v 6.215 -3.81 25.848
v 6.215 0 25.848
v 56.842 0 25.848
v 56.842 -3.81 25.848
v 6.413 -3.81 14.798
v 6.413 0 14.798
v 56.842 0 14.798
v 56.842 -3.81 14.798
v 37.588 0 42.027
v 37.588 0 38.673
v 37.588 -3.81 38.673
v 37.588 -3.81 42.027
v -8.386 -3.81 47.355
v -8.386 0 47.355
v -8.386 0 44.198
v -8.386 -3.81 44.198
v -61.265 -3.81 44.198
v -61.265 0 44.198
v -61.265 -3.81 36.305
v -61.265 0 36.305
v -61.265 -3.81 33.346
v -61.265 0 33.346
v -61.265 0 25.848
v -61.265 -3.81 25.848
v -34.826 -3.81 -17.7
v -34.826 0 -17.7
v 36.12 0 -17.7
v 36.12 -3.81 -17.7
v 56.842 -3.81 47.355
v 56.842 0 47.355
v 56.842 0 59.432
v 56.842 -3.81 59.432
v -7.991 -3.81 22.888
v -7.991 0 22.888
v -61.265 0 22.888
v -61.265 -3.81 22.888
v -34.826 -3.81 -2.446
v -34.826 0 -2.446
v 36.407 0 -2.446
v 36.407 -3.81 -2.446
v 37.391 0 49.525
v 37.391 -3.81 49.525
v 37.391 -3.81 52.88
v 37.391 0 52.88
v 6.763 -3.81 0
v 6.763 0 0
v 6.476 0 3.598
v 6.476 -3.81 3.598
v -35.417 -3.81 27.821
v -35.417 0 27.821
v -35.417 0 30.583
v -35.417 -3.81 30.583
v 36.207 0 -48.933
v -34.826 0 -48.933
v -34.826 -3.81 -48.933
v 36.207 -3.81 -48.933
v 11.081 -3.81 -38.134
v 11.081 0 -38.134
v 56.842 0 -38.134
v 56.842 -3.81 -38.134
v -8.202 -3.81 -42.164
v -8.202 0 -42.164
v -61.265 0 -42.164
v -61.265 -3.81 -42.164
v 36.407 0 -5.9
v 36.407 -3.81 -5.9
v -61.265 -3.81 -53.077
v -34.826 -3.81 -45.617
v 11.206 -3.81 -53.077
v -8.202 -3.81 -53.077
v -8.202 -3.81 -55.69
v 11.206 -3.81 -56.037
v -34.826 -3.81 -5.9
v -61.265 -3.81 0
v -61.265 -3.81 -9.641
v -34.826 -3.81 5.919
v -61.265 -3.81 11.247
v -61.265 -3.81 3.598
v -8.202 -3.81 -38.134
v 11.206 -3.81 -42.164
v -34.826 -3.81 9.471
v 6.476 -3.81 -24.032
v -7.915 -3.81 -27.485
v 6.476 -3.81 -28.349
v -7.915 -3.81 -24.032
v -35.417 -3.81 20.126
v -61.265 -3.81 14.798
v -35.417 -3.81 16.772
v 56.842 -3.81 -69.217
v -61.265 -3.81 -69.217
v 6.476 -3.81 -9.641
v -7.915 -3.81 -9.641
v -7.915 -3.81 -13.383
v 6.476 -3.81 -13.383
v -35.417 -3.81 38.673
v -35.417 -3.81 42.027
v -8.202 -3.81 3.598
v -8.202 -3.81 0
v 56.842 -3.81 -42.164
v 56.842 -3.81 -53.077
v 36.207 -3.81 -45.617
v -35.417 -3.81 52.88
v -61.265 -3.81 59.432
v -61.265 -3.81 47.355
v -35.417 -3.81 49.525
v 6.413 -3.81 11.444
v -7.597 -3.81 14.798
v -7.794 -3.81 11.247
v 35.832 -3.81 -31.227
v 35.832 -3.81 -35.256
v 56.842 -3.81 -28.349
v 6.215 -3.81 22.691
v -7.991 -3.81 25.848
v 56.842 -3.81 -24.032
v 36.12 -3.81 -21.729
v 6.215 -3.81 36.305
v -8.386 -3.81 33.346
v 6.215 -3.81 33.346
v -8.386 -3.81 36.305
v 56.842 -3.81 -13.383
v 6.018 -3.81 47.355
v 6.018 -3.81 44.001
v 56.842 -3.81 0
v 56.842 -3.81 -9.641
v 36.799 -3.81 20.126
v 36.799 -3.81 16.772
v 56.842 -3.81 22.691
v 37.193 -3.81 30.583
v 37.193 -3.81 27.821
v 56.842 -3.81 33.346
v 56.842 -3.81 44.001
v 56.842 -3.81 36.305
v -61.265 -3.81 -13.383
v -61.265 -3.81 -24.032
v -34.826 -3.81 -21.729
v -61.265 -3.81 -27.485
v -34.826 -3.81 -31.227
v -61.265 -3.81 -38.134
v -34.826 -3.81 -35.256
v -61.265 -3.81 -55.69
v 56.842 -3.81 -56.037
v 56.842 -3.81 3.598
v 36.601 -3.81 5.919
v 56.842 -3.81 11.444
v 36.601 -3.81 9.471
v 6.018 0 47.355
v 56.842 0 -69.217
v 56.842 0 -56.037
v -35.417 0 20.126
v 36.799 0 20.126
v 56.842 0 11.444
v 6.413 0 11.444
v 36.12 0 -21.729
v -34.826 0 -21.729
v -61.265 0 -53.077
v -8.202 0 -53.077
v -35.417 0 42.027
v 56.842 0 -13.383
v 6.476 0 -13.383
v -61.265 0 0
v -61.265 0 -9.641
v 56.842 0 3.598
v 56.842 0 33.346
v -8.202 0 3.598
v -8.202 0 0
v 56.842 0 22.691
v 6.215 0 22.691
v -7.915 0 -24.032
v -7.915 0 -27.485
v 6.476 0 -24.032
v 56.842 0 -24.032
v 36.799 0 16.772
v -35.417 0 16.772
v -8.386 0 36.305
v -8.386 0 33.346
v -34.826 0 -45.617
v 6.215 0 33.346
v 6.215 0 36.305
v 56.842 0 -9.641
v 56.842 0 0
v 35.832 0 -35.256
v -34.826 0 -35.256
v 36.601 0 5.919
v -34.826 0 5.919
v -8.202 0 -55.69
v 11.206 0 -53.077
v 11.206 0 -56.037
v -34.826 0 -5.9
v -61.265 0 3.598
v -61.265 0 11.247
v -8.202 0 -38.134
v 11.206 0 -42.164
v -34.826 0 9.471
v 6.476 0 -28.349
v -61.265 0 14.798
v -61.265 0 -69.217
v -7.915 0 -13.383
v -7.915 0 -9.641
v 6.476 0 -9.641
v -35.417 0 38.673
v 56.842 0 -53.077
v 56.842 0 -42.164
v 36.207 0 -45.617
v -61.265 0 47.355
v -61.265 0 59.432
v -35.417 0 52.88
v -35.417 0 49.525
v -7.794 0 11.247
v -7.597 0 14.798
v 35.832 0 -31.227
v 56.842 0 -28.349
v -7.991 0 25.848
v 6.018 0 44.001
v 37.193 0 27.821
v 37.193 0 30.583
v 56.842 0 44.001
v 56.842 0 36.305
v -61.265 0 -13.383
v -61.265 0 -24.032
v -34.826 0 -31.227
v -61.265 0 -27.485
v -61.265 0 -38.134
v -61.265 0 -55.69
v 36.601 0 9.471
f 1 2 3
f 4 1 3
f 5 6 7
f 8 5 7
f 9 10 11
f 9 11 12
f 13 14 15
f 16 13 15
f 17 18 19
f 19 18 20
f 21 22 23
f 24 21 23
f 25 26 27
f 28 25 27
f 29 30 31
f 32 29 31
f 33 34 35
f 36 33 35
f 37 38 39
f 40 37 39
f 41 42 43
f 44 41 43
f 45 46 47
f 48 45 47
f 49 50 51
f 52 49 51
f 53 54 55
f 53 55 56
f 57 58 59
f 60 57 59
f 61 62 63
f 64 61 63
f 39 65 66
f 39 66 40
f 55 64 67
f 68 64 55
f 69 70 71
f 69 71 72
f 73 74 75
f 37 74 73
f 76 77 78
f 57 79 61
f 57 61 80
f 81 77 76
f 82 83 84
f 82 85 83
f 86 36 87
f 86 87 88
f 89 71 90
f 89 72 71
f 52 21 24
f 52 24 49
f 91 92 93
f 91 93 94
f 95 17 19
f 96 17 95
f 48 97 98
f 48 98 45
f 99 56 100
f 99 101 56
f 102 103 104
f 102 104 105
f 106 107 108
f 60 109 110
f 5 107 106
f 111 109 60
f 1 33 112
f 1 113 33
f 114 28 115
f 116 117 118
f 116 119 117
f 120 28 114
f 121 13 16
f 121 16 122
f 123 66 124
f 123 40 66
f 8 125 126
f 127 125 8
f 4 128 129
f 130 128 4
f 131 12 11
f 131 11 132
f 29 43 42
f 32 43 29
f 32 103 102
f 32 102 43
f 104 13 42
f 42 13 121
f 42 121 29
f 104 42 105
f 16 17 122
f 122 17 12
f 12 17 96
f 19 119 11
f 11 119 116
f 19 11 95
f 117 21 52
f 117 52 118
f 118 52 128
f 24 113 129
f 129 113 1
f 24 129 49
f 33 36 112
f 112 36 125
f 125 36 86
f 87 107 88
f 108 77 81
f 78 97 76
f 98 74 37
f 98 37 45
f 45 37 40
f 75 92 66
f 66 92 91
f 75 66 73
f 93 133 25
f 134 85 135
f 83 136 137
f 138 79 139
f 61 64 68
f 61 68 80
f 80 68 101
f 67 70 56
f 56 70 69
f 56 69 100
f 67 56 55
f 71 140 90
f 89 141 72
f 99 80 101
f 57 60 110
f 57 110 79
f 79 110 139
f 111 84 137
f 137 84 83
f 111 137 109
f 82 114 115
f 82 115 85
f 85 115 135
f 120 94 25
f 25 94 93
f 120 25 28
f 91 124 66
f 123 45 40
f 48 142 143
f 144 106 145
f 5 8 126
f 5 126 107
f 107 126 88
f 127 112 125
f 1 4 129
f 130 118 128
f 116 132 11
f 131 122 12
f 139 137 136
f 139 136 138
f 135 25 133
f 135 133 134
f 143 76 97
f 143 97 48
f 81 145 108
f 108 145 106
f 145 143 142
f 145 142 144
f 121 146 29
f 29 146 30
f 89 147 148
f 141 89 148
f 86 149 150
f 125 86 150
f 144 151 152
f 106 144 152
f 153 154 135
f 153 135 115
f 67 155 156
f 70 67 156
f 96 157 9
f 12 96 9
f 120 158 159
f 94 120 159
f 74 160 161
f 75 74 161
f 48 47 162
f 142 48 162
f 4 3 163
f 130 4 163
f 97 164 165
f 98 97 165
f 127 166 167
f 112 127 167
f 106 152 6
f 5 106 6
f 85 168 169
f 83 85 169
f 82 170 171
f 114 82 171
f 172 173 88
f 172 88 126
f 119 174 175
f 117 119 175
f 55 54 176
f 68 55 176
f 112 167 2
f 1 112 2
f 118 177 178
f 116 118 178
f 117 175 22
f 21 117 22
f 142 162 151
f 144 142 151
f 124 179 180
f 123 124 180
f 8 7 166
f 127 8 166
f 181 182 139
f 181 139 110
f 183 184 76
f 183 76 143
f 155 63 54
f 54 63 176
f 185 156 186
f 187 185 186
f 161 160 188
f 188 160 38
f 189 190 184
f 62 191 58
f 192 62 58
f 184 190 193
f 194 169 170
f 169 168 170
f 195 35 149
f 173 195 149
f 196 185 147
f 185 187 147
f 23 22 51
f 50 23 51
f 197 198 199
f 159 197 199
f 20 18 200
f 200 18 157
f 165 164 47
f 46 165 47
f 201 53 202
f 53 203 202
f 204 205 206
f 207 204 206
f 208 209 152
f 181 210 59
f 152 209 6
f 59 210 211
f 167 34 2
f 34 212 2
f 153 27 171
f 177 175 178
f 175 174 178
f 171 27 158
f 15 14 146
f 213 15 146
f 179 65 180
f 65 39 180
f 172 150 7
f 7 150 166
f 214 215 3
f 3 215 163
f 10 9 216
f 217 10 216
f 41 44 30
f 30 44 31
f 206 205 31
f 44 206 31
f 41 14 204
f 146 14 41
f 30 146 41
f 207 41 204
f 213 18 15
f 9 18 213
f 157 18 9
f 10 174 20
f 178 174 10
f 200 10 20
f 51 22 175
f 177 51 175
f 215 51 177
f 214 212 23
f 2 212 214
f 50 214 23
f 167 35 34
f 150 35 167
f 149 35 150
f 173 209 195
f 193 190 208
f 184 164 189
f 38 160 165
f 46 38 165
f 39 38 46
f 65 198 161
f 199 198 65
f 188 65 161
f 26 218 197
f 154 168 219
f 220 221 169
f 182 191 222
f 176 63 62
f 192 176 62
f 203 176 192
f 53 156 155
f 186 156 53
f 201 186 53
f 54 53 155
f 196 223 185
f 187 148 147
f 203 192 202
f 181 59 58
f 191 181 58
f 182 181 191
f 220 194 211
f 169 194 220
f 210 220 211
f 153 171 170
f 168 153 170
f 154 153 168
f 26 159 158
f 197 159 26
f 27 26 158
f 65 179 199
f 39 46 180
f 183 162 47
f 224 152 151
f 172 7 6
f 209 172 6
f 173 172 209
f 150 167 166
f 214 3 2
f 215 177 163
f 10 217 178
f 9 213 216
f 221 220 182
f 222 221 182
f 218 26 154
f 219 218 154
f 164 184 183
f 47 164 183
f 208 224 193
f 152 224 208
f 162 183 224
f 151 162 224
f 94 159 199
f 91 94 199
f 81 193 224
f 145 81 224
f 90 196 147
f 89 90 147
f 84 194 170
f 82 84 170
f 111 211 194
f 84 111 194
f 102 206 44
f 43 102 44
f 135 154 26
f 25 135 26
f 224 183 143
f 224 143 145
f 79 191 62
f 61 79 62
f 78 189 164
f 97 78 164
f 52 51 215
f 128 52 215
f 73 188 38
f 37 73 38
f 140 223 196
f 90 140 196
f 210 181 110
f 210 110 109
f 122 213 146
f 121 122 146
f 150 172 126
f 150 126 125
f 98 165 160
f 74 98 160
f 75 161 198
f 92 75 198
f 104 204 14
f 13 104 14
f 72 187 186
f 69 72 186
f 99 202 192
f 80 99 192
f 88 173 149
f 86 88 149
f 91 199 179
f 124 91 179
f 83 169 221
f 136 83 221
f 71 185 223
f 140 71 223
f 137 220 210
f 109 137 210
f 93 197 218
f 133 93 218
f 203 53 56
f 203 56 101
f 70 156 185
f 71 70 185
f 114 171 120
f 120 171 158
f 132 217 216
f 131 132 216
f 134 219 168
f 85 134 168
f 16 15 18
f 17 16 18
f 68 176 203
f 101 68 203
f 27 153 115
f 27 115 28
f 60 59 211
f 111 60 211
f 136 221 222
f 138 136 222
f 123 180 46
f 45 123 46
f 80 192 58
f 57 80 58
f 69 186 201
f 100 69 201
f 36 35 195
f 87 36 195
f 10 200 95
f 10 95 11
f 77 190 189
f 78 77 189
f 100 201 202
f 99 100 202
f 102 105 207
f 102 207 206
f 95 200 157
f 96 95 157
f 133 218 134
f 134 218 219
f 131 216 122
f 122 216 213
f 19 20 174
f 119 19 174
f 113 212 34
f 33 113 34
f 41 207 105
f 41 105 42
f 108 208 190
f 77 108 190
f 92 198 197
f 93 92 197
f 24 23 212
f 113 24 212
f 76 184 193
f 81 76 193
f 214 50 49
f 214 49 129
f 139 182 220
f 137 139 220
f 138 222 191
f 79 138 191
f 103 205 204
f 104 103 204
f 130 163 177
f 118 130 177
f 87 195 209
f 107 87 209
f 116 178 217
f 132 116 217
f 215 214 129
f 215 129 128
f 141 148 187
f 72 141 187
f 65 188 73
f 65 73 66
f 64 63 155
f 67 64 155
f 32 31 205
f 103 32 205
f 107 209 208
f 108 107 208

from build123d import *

# Parameters (mm, degrees)
F0_W     = 71.032305
F0_H     = 3.316156
F0_W_2   = 70.65738
F0_H_2   = 4.029283
F0_W_3   = 70.945185
F0_H_3   = 4.029279
F0_W_4   = 71.23299
F0_H_4   = 3.453669
F0_W_5   = 71.426928
F0_H_5   = 3.551615
F0_W_6   = 72.216179
F0_H_6   = 3.354305
F0_W_7   = 72.610803
F0_H_7   = 2.762366
F0_W_8   = 73.005423
F0_H_8   = 3.354303
F0_W_9   = 72.808113
F0_H_9   = 3.354299
F1_DEPTH = 3.81


with BuildPart() as f1:
    # F0 (on Front) → F1 (new body)
    with BuildSketch(Plane.XZ):
        Polygon((56.841634, 59.431892), (-61.265364, 59.431892), (-61.265364, 47.354873), (-8.385758, 47.354873), (-8.385758, 44.197883), (-61.265364, 44.197883), (-61.265364, 36.305401), (-8.385758, 36.305401), (-8.385758, 33.345722), (-61.265364, 33.345722), (-61.265364, 25.847867), (-7.991134, 25.847867), (-7.991134, 22.888189), (-61.265364, 22.888189), (-61.265364, 14.798397), (-7.596511, 14.798397), (-7.793822, 11.246782), (-61.265364, 11.246782), (-61.265364, 3.597572), (-8.202464, 3.597572), (-8.202464, 0), (-61.265364, 0), (-61.265364, -9.641493), (-7.914659, -9.641493), (-7.914659, -13.382968), (-61.265364, -13.382968), (-61.265364, -24.031783), (-7.914659, -24.031783), (-7.914659, -27.485449), (-61.265364, -27.485449), (-61.265364, -38.134262), (-8.202464, -38.134262), (-8.202464, -42.163543), (-61.265364, -42.163543), (-61.265364, -53.076919), (-8.202464, -53.076919), (-8.202464, -55.690415), (-61.265364, -55.690415), (-61.265364, -69.217287), (56.841634, -69.217287), (56.841634, -56.036595), (11.206436, -56.036595), (11.206436, -53.076919), (56.841634, -53.076919), (56.841634, -42.163543), (11.206436, -42.163543), (11.080521, -38.134262), (56.841634, -38.134262), (56.841634, -28.348867), (6.475631, -28.348867), (6.475631, -24.031783), (56.841634, -24.031783), (56.841634, -13.382968), (6.475631, -13.382968), (6.475631, -9.641493), (56.841634, -9.641493), (56.841634, 0), (6.763437, 0), (6.475631, 3.597572), (56.841634, 3.597572), (56.841634, 11.444095), (6.412639, 11.444095), (6.412639, 14.798397), (56.841634, 14.798397), (56.841634, 22.690875), (6.215328, 22.690875), (6.215328, 25.847867), (56.841634, 25.847867), (56.841634, 33.345722), (6.215328, 33.345722), (6.215328, 36.305401), (56.841634, 36.305401), (56.841634, 44.000566), (6.018014, 44.000566), (6.018014, 47.354873), (56.841634, 47.354873), align=None)
        with Locations((0.690593, -47.27529)):
            Rectangle(F0_W, F0_H, mode=Mode.SUBTRACT)
        with Locations((0.50313, -33.241566)):
            Rectangle(F0_W_2, F0_H_2, mode=Mode.SUBTRACT)
        with Locations((0.647033, -19.714693)):
            Rectangle(F0_W_3, F0_H_3, mode=Mode.SUBTRACT)
        with Locations((0.790935, -4.173183)):
            Rectangle(F0_W_4, F0_H_4, mode=Mode.SUBTRACT)
        with Locations((0.887904, 7.695167)):
            Rectangle(F0_W_5, F0_H_5, mode=Mode.SUBTRACT)
        with Locations((0.690593, 18.448668)):
            Rectangle(F0_W_6, F0_H_6, mode=Mode.SUBTRACT)
        with Locations((0.887905, 29.202171)):
            Rectangle(F0_W_7, F0_H_7, mode=Mode.SUBTRACT)
        with Locations((1.085214, 40.350296)):
            Rectangle(F0_W_8, F0_H_8, mode=Mode.SUBTRACT)
        with Locations((0.98656, 51.202455)):
            Rectangle(F0_W_9, F0_H_9, mode=Mode.SUBTRACT)
    extrude(amount=F1_DEPTH)


solid = f1.part
